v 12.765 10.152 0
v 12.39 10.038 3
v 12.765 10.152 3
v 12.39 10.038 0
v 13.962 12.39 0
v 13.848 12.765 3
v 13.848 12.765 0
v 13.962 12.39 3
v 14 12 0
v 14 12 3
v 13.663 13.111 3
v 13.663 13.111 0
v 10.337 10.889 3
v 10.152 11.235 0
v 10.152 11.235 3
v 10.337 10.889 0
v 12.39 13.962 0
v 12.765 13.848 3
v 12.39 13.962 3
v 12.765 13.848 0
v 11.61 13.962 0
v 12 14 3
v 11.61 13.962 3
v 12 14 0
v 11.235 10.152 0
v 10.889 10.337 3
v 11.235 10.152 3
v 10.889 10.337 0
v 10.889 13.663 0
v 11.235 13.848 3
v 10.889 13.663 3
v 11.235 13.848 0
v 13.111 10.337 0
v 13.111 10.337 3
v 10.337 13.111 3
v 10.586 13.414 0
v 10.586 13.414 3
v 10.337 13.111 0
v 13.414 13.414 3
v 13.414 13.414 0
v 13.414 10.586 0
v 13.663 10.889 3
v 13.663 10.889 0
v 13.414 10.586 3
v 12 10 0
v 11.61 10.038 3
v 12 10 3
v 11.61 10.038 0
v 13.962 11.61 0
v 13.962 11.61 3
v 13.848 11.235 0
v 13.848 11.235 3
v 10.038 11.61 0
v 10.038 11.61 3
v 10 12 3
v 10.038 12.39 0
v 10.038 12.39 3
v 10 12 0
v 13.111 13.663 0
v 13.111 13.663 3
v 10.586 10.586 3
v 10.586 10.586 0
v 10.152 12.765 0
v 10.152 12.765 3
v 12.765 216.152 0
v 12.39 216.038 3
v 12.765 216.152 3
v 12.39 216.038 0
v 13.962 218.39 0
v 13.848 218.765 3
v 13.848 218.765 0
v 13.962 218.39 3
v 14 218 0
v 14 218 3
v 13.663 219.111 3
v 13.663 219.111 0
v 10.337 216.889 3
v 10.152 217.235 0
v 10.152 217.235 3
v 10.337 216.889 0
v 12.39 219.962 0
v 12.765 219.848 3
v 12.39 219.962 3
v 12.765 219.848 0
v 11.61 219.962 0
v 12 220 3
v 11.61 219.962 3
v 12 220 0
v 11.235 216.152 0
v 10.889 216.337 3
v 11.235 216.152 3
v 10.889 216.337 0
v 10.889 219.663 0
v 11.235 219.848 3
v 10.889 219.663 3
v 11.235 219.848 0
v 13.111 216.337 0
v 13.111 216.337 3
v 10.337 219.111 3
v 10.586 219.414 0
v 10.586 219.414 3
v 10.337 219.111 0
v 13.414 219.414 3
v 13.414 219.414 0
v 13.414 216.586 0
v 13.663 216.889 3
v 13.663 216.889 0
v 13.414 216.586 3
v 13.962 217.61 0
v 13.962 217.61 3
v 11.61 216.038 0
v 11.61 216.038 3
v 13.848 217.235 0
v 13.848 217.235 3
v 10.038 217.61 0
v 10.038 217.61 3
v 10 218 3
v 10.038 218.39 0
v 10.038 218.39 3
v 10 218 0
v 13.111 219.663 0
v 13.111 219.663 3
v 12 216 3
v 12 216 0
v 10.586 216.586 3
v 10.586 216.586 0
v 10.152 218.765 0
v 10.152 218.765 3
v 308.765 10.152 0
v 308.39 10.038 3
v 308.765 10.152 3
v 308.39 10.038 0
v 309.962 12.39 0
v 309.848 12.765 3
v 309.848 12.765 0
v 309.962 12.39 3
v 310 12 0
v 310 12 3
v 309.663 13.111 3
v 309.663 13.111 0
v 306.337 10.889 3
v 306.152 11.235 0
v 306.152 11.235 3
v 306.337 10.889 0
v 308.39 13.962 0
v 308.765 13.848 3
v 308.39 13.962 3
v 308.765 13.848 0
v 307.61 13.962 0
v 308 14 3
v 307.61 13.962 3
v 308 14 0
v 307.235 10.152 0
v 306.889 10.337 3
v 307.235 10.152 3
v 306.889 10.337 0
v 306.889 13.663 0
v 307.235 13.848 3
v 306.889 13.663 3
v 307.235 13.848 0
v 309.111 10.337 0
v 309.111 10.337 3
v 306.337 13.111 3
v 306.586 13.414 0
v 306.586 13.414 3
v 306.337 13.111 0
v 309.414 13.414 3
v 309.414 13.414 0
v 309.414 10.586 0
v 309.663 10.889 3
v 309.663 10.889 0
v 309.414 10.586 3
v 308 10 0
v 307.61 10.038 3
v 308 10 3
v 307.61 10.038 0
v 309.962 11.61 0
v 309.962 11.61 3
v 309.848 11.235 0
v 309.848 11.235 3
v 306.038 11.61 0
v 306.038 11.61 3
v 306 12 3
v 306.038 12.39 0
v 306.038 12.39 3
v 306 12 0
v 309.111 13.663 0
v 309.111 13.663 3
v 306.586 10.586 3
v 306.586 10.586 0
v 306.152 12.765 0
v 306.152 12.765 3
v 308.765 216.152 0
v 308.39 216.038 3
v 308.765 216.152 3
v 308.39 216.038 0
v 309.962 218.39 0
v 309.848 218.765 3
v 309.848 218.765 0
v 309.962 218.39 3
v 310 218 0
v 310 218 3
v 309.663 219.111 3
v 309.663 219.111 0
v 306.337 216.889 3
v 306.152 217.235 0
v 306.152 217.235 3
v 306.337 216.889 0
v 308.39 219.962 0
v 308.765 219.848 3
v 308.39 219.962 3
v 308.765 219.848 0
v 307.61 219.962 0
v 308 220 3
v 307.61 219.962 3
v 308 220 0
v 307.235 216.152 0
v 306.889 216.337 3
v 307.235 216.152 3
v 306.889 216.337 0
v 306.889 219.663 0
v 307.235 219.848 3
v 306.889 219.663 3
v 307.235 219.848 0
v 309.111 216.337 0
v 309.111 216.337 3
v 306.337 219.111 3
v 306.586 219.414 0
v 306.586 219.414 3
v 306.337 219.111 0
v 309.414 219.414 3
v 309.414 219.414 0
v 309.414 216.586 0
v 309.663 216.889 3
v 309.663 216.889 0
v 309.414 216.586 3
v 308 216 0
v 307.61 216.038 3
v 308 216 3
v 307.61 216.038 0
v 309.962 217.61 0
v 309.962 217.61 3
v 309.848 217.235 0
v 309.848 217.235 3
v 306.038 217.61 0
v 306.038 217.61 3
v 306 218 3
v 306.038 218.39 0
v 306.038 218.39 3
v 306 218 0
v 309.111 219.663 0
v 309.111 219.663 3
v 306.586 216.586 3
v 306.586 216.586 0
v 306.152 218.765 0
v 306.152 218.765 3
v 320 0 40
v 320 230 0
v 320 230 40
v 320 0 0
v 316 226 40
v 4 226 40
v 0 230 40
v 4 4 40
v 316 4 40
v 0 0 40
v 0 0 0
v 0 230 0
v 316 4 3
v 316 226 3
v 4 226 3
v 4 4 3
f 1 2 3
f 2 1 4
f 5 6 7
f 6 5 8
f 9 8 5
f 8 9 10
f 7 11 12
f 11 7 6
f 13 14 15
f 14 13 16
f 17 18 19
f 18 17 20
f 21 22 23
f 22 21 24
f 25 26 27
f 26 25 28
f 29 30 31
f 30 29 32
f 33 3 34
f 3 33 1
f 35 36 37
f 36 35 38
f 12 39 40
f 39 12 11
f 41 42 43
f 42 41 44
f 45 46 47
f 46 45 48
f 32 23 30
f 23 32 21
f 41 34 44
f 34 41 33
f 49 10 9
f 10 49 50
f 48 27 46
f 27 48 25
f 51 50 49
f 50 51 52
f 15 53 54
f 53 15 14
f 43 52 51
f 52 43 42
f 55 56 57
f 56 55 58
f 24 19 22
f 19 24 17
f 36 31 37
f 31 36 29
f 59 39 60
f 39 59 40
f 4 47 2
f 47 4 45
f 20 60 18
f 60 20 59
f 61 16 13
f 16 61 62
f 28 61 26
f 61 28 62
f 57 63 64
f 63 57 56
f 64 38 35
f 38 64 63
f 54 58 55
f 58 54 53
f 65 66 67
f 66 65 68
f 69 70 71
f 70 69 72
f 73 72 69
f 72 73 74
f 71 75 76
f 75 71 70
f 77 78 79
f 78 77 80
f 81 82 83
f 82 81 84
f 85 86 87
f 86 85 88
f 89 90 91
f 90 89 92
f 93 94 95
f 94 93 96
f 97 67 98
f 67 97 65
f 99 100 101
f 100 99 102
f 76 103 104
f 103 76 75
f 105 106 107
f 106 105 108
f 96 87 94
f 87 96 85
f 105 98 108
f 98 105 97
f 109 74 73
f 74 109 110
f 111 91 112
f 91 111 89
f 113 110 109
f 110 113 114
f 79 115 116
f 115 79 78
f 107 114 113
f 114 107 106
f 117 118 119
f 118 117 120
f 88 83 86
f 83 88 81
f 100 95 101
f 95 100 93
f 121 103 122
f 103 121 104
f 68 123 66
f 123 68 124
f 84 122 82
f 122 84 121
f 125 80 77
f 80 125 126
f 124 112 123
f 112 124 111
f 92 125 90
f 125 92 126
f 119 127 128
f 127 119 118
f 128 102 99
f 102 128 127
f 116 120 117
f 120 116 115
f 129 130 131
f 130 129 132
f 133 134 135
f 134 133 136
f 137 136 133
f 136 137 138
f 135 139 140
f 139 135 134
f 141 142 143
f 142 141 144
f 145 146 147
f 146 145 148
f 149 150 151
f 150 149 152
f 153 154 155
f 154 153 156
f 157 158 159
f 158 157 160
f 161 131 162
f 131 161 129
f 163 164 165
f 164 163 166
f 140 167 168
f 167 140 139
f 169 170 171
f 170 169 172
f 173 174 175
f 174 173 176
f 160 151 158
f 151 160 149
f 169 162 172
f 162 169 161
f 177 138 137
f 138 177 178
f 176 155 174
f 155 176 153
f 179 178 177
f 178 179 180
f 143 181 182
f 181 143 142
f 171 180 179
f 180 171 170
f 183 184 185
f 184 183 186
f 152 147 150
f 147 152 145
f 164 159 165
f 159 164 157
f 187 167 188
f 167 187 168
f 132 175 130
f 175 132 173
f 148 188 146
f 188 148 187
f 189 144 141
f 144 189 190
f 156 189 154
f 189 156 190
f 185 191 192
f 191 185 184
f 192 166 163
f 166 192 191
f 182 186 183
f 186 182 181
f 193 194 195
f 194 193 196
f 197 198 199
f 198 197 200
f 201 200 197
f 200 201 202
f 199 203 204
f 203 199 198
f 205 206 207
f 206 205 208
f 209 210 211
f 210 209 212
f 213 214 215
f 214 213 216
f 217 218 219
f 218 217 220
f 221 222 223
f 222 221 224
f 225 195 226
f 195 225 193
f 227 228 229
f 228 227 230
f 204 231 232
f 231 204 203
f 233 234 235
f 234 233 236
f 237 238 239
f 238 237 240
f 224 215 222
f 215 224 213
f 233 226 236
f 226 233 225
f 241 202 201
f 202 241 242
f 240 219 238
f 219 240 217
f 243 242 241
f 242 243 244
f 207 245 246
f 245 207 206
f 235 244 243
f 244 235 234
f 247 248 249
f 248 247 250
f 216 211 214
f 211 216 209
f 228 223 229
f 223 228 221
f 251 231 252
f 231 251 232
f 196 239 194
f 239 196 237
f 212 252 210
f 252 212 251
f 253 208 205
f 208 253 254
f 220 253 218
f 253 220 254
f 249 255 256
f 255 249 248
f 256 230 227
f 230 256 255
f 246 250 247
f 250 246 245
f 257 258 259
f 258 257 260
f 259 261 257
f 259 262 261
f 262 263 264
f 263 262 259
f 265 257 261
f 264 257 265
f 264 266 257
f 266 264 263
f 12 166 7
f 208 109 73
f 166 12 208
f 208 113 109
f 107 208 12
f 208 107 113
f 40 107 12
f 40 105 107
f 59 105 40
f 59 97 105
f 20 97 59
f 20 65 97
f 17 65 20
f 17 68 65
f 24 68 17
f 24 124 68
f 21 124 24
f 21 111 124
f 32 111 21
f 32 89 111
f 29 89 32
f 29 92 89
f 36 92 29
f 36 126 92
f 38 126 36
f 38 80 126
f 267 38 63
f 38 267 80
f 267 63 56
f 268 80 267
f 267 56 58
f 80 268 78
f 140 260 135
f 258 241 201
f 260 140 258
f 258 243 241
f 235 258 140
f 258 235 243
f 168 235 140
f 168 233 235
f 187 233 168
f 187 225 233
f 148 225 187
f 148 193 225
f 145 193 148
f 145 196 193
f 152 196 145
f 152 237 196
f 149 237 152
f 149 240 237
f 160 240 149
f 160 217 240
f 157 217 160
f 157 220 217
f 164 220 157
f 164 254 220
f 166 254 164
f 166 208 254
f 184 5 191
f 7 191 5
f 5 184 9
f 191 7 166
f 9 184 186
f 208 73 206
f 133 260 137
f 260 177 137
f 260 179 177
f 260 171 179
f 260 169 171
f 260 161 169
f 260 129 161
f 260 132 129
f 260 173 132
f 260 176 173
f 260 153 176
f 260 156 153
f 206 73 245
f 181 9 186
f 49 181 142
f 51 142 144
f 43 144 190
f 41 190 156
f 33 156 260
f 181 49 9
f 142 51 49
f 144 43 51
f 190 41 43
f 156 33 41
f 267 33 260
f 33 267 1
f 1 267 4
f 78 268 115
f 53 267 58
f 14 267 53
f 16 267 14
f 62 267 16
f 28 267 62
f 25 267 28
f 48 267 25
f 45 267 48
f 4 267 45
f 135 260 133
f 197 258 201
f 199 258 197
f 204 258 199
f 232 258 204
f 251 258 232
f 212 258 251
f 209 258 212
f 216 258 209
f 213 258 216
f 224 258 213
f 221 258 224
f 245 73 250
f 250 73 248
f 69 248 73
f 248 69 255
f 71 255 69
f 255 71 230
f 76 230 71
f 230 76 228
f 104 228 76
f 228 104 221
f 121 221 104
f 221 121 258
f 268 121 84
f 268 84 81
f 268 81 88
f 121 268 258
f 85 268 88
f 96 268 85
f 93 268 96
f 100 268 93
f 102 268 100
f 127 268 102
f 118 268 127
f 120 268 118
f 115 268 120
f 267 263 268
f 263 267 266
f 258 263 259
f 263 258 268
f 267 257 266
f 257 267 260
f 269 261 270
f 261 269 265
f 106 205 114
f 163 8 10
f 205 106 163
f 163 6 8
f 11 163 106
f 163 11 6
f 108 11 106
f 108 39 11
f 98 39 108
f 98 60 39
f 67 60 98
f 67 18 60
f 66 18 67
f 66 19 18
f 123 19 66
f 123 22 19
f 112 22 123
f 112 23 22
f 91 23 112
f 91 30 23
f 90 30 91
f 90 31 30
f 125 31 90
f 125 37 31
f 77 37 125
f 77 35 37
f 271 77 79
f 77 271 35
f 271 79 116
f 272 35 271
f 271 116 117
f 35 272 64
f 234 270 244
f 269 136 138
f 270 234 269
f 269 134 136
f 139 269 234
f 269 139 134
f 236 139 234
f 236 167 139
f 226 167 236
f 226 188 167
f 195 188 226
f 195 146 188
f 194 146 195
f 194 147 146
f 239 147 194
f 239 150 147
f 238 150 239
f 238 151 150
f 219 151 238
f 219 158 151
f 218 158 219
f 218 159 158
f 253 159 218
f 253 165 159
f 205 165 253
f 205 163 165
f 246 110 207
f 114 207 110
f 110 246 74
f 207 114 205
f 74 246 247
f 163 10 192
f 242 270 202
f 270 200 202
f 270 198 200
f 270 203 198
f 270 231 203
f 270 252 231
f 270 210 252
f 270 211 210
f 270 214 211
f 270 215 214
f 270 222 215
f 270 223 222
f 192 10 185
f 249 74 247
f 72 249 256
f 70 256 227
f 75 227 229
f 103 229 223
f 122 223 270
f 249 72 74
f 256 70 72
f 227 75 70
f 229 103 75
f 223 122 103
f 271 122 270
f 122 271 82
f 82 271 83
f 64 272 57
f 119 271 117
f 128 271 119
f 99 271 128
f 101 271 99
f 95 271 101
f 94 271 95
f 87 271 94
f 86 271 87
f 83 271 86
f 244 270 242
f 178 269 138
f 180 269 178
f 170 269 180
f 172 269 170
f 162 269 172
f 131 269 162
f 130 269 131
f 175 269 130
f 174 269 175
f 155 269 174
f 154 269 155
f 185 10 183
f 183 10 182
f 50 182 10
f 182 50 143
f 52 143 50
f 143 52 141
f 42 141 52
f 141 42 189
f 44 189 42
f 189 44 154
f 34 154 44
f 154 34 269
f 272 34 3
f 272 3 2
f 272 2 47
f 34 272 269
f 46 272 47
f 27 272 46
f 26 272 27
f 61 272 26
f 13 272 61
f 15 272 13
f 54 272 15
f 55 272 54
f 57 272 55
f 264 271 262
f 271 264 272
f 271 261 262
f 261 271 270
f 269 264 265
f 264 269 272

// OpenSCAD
// Concept only. Provisional dimensions in mm.
$fn=32;
difference(){cube([320,230,40]);translate([4,4,3])cube([312,222,40]);for(x=[12,308])for(y=[12,218])translate([x,y,-1])cylinder(h=42,r=2);}
